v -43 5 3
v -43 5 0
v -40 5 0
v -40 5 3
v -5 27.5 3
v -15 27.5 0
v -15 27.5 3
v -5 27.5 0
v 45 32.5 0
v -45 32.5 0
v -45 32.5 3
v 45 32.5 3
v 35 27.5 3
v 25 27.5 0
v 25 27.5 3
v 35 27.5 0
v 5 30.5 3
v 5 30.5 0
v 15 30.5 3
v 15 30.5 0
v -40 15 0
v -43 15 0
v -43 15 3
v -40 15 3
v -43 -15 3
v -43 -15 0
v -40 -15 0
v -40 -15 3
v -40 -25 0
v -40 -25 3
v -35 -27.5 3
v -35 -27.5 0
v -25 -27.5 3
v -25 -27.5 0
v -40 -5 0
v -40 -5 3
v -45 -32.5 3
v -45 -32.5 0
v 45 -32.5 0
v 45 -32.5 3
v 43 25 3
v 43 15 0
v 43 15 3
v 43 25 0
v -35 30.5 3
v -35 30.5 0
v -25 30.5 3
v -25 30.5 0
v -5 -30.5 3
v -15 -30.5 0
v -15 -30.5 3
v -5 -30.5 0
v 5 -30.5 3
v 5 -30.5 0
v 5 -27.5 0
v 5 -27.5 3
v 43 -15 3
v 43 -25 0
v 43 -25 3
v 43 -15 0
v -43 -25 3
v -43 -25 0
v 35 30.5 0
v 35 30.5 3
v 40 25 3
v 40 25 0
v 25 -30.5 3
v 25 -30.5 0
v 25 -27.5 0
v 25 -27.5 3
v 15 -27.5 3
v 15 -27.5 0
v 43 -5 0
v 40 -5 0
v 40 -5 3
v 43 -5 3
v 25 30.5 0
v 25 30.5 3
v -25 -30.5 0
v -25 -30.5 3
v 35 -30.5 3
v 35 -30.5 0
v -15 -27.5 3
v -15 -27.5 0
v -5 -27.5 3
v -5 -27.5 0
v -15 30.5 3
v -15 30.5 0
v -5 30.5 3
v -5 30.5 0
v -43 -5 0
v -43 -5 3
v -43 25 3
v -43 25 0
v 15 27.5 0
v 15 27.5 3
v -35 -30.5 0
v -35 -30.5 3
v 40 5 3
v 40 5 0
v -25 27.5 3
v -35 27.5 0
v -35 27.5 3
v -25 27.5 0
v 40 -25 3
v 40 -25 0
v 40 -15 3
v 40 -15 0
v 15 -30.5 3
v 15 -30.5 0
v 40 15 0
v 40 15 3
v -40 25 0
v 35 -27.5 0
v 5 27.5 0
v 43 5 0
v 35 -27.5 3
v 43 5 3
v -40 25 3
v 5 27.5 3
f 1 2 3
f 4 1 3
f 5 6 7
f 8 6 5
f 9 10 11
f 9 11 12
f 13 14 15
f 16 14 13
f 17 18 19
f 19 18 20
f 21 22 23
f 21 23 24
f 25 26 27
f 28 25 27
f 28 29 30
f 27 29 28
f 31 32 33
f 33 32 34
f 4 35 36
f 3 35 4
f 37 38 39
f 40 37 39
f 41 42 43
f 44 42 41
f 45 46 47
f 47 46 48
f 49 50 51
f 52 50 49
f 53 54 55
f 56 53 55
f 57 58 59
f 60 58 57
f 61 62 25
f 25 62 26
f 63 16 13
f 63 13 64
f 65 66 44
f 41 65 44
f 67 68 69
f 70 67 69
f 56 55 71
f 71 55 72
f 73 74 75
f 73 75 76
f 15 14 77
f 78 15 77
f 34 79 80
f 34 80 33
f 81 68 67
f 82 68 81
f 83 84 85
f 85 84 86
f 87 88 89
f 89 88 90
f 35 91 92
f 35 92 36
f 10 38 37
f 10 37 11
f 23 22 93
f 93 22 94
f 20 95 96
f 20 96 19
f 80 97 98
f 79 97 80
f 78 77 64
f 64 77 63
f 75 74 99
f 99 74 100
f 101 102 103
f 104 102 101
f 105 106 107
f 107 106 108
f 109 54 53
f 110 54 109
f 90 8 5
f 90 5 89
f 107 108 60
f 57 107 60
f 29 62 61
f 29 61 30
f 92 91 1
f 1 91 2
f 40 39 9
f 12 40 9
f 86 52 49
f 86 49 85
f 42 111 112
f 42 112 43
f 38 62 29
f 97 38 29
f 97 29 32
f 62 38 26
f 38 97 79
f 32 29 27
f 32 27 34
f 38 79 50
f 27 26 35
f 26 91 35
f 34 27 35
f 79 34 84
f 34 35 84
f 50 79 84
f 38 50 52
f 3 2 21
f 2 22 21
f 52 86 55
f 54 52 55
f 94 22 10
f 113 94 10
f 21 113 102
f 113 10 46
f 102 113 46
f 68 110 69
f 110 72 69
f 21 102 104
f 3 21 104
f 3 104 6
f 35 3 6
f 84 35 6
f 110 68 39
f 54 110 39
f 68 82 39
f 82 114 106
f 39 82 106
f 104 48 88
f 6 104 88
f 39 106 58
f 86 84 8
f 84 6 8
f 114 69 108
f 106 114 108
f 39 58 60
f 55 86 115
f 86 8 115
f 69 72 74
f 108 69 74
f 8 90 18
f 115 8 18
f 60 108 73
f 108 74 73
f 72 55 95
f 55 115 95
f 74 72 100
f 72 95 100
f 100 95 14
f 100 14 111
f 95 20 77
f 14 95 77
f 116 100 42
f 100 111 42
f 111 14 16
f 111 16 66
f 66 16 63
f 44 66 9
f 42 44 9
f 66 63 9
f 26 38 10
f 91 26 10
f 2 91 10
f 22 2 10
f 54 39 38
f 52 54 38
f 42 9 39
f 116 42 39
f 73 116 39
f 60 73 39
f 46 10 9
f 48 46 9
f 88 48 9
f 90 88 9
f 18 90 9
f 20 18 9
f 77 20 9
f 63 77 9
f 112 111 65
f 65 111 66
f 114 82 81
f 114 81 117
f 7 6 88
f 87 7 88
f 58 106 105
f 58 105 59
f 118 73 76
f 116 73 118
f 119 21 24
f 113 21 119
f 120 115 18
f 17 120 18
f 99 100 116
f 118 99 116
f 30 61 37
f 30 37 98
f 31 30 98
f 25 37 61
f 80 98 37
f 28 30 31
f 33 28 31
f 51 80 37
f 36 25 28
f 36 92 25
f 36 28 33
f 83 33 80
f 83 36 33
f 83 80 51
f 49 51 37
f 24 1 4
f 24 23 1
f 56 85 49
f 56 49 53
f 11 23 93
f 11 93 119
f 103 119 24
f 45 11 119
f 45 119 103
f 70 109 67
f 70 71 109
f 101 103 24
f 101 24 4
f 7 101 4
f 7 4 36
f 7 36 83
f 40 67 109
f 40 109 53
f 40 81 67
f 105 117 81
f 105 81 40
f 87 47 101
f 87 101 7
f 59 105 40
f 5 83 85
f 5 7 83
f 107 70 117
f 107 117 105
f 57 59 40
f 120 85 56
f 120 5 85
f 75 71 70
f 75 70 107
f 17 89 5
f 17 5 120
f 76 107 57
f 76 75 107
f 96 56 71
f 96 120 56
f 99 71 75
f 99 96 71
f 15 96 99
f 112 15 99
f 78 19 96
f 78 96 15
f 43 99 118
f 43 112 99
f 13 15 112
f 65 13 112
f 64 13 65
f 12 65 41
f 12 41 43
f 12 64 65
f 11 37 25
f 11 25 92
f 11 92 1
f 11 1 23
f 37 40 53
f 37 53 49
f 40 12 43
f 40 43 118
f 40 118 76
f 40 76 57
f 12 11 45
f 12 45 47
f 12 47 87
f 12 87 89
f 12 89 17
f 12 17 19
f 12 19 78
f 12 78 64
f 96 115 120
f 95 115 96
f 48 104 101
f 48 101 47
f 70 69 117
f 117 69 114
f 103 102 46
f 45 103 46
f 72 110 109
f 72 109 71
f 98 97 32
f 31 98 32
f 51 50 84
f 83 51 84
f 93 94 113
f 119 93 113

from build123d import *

# Parameters (mm, degrees)
SKETCH_1_W      = 90
SKETCH_1_H      = 65
SKETCH_1_W_2    = 10
SKETCH_1_H_2    = 3
SKETCH_1_W_3    = 3
SKETCH_1_H_3    = 10
EXTRUDE_1_DEPTH = 3


with BuildPart() as part:
    # 草图1 → 凸台-拉伸1 (new body)
    with BuildSketch(Plane.XY):
        Rectangle(SKETCH_1_W, SKETCH_1_H)
        with Locations((-10, 29)):
            Rectangle(SKETCH_1_W_2, SKETCH_1_H_2, mode=Mode.SUBTRACT)
        with Locations((-30, 29)):
            Rectangle(SKETCH_1_W_2, SKETCH_1_H_2, mode=Mode.SUBTRACT)
        with Locations((-41.5, 20)):
            Rectangle(SKETCH_1_W_3, SKETCH_1_H_3, mode=Mode.SUBTRACT)
        with Locations((10, 29)):
            Rectangle(SKETCH_1_W_2, SKETCH_1_H_2, mode=Mode.SUBTRACT)
        with Locations((30, 29)):
            Rectangle(SKETCH_1_W_2, SKETCH_1_H_2, mode=Mode.SUBTRACT)
        with Locations((-41.5, 0)):
            Rectangle(SKETCH_1_W_3, SKETCH_1_H_3, mode=Mode.SUBTRACT)
        with Locations((-41.5, -20)):
            Rectangle(SKETCH_1_W_3, SKETCH_1_H_3, mode=Mode.SUBTRACT)
        with Locations((41.5, -20)):
            Rectangle(SKETCH_1_W_3, SKETCH_1_H_3, mode=Mode.SUBTRACT)
        with Locations((41.5, 0)):
            Rectangle(SKETCH_1_W_3, SKETCH_1_H_3, mode=Mode.SUBTRACT)
        with Locations((41.5, 20)):
            Rectangle(SKETCH_1_W_3, SKETCH_1_H_3, mode=Mode.SUBTRACT)
        with Locations((30, -29)):
            Rectangle(SKETCH_1_W_2, SKETCH_1_H_2, mode=Mode.SUBTRACT)
        with Locations((10, -29)):
            Rectangle(SKETCH_1_W_2, SKETCH_1_H_2, mode=Mode.SUBTRACT)
        with Locations((-10, -29)):
            Rectangle(SKETCH_1_W_2, SKETCH_1_H_2, mode=Mode.SUBTRACT)
        with Locations((-30, -29)):
            Rectangle(SKETCH_1_W_2, SKETCH_1_H_2, mode=Mode.SUBTRACT)
    extrude(amount=EXTRUDE_1_DEPTH)


solid = part.part
